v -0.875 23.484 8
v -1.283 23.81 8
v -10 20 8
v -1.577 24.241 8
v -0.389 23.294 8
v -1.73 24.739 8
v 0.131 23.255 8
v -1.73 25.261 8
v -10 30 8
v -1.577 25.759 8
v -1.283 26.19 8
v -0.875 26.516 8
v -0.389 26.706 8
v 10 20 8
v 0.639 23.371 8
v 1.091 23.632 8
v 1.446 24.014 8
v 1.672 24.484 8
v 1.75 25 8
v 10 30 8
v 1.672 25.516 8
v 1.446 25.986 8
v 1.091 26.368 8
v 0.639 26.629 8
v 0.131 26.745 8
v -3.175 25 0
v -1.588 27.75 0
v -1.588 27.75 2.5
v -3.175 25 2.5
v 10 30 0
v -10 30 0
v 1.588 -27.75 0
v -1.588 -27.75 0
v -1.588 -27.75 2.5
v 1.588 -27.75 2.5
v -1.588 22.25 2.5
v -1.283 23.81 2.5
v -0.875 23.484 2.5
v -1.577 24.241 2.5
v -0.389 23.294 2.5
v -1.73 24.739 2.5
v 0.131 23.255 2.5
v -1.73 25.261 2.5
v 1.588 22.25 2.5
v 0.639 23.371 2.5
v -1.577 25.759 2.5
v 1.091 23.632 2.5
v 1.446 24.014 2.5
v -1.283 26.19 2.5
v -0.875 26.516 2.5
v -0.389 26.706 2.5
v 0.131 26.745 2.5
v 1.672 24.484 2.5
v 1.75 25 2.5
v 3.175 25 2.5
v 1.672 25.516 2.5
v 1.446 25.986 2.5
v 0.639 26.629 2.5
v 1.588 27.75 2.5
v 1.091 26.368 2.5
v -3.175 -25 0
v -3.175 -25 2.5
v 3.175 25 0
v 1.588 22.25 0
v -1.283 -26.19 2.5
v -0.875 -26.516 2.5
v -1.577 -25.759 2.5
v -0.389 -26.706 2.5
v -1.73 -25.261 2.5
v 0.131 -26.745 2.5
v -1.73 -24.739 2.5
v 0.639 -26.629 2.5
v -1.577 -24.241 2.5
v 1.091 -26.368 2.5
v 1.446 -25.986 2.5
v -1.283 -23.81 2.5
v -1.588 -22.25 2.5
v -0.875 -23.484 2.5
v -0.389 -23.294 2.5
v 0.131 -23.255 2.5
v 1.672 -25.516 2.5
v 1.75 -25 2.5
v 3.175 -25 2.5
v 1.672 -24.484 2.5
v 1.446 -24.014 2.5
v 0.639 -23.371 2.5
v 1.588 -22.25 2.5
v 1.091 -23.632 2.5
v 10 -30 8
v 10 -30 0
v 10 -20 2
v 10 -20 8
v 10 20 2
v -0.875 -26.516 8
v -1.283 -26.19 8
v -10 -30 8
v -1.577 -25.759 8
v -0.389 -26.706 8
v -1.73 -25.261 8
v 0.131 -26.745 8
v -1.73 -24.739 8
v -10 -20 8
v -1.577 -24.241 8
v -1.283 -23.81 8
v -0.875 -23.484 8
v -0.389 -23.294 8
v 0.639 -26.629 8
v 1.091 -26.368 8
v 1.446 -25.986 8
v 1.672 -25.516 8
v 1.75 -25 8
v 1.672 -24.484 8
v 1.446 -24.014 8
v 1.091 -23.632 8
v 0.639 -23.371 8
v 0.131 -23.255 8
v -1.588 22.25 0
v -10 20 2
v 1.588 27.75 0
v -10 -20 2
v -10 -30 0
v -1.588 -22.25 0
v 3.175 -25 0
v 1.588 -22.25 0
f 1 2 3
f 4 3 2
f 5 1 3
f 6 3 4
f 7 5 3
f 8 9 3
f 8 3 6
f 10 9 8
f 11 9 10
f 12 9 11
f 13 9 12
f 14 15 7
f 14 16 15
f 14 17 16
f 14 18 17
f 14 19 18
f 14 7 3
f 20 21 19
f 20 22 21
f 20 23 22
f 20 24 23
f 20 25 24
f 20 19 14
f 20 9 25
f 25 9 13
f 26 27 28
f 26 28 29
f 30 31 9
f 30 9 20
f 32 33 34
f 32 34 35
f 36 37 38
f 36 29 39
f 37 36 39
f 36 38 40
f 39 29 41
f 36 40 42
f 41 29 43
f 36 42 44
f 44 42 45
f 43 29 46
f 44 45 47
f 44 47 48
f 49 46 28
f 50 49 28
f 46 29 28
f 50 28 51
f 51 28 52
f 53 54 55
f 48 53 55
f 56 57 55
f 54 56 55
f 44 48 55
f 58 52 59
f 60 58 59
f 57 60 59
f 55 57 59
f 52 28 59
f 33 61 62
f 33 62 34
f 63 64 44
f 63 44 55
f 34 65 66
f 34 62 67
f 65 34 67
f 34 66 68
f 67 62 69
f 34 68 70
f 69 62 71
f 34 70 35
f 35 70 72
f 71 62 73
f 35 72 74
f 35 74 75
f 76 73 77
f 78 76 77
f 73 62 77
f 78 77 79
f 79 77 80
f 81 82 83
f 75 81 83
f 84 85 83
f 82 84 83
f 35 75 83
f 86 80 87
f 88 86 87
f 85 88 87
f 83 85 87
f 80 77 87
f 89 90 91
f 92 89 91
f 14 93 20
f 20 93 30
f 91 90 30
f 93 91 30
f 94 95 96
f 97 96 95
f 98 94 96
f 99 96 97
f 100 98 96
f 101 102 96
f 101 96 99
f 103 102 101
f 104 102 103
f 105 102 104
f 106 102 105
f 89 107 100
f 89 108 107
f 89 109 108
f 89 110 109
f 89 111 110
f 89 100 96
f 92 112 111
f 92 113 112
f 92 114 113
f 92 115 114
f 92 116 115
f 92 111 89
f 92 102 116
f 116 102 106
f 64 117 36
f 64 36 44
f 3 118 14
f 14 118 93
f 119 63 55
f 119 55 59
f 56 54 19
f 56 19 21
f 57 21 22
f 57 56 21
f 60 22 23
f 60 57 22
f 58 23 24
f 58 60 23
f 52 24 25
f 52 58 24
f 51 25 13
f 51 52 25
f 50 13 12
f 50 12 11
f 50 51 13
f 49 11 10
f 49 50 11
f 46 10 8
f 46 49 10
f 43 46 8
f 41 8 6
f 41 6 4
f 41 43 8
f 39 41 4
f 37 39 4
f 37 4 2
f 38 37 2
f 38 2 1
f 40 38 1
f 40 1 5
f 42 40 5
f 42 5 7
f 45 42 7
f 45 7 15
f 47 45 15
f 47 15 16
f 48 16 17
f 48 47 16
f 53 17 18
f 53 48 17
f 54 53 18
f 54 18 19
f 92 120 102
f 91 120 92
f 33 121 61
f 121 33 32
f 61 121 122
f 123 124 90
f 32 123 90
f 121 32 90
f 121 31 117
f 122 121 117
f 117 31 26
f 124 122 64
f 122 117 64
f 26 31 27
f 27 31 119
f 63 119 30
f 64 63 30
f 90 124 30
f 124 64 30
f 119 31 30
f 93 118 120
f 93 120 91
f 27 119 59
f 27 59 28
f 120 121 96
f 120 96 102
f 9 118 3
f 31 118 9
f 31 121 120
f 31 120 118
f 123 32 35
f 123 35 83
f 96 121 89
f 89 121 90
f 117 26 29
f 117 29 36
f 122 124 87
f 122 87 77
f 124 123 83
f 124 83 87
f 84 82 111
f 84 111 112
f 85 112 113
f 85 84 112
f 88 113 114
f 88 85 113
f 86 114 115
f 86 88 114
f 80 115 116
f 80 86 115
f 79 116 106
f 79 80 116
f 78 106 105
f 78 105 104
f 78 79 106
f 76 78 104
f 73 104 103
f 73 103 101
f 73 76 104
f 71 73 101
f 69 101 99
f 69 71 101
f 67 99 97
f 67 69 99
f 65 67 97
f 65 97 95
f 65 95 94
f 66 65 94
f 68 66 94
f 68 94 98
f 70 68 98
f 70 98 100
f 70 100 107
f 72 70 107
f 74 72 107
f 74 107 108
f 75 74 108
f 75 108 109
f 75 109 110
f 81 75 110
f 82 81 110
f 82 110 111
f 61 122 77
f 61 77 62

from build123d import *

# Parameters (mm, degrees)
F0_W     = 20
F0_H     = 60
F0_R     = 1.75
F1_DEPTH = 2
F2_W     = 20
F2_H     = 10
F2_R     = 1.75
F3_DEPTH = 6
F5_DEPTH = 2.5


with BuildPart() as f1:
    # F0 (on Top) → F1 (new body)
    with BuildSketch(Plane.XY):
        Rectangle(F0_W, F0_H)
        with Locations((0, -25)):
            Circle(F0_R, mode=Mode.SUBTRACT)
        with Locations((0, 25)):
            Circle(F0_R, mode=Mode.SUBTRACT)
    extrude(amount=F1_DEPTH)

    # F2 (on face) → F3 (join)
    with BuildSketch(Plane.XY.offset(2)):
        with Locations((0, 25)):
            Rectangle(F2_W, F2_H)
        with Locations((0, 25)):
            Circle(F2_R, mode=Mode.SUBTRACT)
        with Locations((0, -25)):
            Rectangle(F2_W, F2_H)
        with Locations((0, -25)):
            Circle(F2_R, mode=Mode.SUBTRACT)
    extrude(amount=F3_DEPTH)

    # F4 (on face) → F5 (cut)
    with BuildSketch(Plane.XY):
        Polygon((1.5877132403, -22.25), (-1.5877132403, -22.25), (-3.1754264805, -25), (-1.5877132403, -27.75), (1.5877132403, -27.75), (3.1754264805, -25), align=None)
        Polygon((1.5877132403, 27.75), (-1.5877132403, 27.75), (-3.1754264805, 25), (-1.5877132403, 22.25), (1.5877132403, 22.25), (3.1754264805, 25), align=None)
    extrude(amount=F5_DEPTH, mode=Mode.SUBTRACT)


solid = f1.part
